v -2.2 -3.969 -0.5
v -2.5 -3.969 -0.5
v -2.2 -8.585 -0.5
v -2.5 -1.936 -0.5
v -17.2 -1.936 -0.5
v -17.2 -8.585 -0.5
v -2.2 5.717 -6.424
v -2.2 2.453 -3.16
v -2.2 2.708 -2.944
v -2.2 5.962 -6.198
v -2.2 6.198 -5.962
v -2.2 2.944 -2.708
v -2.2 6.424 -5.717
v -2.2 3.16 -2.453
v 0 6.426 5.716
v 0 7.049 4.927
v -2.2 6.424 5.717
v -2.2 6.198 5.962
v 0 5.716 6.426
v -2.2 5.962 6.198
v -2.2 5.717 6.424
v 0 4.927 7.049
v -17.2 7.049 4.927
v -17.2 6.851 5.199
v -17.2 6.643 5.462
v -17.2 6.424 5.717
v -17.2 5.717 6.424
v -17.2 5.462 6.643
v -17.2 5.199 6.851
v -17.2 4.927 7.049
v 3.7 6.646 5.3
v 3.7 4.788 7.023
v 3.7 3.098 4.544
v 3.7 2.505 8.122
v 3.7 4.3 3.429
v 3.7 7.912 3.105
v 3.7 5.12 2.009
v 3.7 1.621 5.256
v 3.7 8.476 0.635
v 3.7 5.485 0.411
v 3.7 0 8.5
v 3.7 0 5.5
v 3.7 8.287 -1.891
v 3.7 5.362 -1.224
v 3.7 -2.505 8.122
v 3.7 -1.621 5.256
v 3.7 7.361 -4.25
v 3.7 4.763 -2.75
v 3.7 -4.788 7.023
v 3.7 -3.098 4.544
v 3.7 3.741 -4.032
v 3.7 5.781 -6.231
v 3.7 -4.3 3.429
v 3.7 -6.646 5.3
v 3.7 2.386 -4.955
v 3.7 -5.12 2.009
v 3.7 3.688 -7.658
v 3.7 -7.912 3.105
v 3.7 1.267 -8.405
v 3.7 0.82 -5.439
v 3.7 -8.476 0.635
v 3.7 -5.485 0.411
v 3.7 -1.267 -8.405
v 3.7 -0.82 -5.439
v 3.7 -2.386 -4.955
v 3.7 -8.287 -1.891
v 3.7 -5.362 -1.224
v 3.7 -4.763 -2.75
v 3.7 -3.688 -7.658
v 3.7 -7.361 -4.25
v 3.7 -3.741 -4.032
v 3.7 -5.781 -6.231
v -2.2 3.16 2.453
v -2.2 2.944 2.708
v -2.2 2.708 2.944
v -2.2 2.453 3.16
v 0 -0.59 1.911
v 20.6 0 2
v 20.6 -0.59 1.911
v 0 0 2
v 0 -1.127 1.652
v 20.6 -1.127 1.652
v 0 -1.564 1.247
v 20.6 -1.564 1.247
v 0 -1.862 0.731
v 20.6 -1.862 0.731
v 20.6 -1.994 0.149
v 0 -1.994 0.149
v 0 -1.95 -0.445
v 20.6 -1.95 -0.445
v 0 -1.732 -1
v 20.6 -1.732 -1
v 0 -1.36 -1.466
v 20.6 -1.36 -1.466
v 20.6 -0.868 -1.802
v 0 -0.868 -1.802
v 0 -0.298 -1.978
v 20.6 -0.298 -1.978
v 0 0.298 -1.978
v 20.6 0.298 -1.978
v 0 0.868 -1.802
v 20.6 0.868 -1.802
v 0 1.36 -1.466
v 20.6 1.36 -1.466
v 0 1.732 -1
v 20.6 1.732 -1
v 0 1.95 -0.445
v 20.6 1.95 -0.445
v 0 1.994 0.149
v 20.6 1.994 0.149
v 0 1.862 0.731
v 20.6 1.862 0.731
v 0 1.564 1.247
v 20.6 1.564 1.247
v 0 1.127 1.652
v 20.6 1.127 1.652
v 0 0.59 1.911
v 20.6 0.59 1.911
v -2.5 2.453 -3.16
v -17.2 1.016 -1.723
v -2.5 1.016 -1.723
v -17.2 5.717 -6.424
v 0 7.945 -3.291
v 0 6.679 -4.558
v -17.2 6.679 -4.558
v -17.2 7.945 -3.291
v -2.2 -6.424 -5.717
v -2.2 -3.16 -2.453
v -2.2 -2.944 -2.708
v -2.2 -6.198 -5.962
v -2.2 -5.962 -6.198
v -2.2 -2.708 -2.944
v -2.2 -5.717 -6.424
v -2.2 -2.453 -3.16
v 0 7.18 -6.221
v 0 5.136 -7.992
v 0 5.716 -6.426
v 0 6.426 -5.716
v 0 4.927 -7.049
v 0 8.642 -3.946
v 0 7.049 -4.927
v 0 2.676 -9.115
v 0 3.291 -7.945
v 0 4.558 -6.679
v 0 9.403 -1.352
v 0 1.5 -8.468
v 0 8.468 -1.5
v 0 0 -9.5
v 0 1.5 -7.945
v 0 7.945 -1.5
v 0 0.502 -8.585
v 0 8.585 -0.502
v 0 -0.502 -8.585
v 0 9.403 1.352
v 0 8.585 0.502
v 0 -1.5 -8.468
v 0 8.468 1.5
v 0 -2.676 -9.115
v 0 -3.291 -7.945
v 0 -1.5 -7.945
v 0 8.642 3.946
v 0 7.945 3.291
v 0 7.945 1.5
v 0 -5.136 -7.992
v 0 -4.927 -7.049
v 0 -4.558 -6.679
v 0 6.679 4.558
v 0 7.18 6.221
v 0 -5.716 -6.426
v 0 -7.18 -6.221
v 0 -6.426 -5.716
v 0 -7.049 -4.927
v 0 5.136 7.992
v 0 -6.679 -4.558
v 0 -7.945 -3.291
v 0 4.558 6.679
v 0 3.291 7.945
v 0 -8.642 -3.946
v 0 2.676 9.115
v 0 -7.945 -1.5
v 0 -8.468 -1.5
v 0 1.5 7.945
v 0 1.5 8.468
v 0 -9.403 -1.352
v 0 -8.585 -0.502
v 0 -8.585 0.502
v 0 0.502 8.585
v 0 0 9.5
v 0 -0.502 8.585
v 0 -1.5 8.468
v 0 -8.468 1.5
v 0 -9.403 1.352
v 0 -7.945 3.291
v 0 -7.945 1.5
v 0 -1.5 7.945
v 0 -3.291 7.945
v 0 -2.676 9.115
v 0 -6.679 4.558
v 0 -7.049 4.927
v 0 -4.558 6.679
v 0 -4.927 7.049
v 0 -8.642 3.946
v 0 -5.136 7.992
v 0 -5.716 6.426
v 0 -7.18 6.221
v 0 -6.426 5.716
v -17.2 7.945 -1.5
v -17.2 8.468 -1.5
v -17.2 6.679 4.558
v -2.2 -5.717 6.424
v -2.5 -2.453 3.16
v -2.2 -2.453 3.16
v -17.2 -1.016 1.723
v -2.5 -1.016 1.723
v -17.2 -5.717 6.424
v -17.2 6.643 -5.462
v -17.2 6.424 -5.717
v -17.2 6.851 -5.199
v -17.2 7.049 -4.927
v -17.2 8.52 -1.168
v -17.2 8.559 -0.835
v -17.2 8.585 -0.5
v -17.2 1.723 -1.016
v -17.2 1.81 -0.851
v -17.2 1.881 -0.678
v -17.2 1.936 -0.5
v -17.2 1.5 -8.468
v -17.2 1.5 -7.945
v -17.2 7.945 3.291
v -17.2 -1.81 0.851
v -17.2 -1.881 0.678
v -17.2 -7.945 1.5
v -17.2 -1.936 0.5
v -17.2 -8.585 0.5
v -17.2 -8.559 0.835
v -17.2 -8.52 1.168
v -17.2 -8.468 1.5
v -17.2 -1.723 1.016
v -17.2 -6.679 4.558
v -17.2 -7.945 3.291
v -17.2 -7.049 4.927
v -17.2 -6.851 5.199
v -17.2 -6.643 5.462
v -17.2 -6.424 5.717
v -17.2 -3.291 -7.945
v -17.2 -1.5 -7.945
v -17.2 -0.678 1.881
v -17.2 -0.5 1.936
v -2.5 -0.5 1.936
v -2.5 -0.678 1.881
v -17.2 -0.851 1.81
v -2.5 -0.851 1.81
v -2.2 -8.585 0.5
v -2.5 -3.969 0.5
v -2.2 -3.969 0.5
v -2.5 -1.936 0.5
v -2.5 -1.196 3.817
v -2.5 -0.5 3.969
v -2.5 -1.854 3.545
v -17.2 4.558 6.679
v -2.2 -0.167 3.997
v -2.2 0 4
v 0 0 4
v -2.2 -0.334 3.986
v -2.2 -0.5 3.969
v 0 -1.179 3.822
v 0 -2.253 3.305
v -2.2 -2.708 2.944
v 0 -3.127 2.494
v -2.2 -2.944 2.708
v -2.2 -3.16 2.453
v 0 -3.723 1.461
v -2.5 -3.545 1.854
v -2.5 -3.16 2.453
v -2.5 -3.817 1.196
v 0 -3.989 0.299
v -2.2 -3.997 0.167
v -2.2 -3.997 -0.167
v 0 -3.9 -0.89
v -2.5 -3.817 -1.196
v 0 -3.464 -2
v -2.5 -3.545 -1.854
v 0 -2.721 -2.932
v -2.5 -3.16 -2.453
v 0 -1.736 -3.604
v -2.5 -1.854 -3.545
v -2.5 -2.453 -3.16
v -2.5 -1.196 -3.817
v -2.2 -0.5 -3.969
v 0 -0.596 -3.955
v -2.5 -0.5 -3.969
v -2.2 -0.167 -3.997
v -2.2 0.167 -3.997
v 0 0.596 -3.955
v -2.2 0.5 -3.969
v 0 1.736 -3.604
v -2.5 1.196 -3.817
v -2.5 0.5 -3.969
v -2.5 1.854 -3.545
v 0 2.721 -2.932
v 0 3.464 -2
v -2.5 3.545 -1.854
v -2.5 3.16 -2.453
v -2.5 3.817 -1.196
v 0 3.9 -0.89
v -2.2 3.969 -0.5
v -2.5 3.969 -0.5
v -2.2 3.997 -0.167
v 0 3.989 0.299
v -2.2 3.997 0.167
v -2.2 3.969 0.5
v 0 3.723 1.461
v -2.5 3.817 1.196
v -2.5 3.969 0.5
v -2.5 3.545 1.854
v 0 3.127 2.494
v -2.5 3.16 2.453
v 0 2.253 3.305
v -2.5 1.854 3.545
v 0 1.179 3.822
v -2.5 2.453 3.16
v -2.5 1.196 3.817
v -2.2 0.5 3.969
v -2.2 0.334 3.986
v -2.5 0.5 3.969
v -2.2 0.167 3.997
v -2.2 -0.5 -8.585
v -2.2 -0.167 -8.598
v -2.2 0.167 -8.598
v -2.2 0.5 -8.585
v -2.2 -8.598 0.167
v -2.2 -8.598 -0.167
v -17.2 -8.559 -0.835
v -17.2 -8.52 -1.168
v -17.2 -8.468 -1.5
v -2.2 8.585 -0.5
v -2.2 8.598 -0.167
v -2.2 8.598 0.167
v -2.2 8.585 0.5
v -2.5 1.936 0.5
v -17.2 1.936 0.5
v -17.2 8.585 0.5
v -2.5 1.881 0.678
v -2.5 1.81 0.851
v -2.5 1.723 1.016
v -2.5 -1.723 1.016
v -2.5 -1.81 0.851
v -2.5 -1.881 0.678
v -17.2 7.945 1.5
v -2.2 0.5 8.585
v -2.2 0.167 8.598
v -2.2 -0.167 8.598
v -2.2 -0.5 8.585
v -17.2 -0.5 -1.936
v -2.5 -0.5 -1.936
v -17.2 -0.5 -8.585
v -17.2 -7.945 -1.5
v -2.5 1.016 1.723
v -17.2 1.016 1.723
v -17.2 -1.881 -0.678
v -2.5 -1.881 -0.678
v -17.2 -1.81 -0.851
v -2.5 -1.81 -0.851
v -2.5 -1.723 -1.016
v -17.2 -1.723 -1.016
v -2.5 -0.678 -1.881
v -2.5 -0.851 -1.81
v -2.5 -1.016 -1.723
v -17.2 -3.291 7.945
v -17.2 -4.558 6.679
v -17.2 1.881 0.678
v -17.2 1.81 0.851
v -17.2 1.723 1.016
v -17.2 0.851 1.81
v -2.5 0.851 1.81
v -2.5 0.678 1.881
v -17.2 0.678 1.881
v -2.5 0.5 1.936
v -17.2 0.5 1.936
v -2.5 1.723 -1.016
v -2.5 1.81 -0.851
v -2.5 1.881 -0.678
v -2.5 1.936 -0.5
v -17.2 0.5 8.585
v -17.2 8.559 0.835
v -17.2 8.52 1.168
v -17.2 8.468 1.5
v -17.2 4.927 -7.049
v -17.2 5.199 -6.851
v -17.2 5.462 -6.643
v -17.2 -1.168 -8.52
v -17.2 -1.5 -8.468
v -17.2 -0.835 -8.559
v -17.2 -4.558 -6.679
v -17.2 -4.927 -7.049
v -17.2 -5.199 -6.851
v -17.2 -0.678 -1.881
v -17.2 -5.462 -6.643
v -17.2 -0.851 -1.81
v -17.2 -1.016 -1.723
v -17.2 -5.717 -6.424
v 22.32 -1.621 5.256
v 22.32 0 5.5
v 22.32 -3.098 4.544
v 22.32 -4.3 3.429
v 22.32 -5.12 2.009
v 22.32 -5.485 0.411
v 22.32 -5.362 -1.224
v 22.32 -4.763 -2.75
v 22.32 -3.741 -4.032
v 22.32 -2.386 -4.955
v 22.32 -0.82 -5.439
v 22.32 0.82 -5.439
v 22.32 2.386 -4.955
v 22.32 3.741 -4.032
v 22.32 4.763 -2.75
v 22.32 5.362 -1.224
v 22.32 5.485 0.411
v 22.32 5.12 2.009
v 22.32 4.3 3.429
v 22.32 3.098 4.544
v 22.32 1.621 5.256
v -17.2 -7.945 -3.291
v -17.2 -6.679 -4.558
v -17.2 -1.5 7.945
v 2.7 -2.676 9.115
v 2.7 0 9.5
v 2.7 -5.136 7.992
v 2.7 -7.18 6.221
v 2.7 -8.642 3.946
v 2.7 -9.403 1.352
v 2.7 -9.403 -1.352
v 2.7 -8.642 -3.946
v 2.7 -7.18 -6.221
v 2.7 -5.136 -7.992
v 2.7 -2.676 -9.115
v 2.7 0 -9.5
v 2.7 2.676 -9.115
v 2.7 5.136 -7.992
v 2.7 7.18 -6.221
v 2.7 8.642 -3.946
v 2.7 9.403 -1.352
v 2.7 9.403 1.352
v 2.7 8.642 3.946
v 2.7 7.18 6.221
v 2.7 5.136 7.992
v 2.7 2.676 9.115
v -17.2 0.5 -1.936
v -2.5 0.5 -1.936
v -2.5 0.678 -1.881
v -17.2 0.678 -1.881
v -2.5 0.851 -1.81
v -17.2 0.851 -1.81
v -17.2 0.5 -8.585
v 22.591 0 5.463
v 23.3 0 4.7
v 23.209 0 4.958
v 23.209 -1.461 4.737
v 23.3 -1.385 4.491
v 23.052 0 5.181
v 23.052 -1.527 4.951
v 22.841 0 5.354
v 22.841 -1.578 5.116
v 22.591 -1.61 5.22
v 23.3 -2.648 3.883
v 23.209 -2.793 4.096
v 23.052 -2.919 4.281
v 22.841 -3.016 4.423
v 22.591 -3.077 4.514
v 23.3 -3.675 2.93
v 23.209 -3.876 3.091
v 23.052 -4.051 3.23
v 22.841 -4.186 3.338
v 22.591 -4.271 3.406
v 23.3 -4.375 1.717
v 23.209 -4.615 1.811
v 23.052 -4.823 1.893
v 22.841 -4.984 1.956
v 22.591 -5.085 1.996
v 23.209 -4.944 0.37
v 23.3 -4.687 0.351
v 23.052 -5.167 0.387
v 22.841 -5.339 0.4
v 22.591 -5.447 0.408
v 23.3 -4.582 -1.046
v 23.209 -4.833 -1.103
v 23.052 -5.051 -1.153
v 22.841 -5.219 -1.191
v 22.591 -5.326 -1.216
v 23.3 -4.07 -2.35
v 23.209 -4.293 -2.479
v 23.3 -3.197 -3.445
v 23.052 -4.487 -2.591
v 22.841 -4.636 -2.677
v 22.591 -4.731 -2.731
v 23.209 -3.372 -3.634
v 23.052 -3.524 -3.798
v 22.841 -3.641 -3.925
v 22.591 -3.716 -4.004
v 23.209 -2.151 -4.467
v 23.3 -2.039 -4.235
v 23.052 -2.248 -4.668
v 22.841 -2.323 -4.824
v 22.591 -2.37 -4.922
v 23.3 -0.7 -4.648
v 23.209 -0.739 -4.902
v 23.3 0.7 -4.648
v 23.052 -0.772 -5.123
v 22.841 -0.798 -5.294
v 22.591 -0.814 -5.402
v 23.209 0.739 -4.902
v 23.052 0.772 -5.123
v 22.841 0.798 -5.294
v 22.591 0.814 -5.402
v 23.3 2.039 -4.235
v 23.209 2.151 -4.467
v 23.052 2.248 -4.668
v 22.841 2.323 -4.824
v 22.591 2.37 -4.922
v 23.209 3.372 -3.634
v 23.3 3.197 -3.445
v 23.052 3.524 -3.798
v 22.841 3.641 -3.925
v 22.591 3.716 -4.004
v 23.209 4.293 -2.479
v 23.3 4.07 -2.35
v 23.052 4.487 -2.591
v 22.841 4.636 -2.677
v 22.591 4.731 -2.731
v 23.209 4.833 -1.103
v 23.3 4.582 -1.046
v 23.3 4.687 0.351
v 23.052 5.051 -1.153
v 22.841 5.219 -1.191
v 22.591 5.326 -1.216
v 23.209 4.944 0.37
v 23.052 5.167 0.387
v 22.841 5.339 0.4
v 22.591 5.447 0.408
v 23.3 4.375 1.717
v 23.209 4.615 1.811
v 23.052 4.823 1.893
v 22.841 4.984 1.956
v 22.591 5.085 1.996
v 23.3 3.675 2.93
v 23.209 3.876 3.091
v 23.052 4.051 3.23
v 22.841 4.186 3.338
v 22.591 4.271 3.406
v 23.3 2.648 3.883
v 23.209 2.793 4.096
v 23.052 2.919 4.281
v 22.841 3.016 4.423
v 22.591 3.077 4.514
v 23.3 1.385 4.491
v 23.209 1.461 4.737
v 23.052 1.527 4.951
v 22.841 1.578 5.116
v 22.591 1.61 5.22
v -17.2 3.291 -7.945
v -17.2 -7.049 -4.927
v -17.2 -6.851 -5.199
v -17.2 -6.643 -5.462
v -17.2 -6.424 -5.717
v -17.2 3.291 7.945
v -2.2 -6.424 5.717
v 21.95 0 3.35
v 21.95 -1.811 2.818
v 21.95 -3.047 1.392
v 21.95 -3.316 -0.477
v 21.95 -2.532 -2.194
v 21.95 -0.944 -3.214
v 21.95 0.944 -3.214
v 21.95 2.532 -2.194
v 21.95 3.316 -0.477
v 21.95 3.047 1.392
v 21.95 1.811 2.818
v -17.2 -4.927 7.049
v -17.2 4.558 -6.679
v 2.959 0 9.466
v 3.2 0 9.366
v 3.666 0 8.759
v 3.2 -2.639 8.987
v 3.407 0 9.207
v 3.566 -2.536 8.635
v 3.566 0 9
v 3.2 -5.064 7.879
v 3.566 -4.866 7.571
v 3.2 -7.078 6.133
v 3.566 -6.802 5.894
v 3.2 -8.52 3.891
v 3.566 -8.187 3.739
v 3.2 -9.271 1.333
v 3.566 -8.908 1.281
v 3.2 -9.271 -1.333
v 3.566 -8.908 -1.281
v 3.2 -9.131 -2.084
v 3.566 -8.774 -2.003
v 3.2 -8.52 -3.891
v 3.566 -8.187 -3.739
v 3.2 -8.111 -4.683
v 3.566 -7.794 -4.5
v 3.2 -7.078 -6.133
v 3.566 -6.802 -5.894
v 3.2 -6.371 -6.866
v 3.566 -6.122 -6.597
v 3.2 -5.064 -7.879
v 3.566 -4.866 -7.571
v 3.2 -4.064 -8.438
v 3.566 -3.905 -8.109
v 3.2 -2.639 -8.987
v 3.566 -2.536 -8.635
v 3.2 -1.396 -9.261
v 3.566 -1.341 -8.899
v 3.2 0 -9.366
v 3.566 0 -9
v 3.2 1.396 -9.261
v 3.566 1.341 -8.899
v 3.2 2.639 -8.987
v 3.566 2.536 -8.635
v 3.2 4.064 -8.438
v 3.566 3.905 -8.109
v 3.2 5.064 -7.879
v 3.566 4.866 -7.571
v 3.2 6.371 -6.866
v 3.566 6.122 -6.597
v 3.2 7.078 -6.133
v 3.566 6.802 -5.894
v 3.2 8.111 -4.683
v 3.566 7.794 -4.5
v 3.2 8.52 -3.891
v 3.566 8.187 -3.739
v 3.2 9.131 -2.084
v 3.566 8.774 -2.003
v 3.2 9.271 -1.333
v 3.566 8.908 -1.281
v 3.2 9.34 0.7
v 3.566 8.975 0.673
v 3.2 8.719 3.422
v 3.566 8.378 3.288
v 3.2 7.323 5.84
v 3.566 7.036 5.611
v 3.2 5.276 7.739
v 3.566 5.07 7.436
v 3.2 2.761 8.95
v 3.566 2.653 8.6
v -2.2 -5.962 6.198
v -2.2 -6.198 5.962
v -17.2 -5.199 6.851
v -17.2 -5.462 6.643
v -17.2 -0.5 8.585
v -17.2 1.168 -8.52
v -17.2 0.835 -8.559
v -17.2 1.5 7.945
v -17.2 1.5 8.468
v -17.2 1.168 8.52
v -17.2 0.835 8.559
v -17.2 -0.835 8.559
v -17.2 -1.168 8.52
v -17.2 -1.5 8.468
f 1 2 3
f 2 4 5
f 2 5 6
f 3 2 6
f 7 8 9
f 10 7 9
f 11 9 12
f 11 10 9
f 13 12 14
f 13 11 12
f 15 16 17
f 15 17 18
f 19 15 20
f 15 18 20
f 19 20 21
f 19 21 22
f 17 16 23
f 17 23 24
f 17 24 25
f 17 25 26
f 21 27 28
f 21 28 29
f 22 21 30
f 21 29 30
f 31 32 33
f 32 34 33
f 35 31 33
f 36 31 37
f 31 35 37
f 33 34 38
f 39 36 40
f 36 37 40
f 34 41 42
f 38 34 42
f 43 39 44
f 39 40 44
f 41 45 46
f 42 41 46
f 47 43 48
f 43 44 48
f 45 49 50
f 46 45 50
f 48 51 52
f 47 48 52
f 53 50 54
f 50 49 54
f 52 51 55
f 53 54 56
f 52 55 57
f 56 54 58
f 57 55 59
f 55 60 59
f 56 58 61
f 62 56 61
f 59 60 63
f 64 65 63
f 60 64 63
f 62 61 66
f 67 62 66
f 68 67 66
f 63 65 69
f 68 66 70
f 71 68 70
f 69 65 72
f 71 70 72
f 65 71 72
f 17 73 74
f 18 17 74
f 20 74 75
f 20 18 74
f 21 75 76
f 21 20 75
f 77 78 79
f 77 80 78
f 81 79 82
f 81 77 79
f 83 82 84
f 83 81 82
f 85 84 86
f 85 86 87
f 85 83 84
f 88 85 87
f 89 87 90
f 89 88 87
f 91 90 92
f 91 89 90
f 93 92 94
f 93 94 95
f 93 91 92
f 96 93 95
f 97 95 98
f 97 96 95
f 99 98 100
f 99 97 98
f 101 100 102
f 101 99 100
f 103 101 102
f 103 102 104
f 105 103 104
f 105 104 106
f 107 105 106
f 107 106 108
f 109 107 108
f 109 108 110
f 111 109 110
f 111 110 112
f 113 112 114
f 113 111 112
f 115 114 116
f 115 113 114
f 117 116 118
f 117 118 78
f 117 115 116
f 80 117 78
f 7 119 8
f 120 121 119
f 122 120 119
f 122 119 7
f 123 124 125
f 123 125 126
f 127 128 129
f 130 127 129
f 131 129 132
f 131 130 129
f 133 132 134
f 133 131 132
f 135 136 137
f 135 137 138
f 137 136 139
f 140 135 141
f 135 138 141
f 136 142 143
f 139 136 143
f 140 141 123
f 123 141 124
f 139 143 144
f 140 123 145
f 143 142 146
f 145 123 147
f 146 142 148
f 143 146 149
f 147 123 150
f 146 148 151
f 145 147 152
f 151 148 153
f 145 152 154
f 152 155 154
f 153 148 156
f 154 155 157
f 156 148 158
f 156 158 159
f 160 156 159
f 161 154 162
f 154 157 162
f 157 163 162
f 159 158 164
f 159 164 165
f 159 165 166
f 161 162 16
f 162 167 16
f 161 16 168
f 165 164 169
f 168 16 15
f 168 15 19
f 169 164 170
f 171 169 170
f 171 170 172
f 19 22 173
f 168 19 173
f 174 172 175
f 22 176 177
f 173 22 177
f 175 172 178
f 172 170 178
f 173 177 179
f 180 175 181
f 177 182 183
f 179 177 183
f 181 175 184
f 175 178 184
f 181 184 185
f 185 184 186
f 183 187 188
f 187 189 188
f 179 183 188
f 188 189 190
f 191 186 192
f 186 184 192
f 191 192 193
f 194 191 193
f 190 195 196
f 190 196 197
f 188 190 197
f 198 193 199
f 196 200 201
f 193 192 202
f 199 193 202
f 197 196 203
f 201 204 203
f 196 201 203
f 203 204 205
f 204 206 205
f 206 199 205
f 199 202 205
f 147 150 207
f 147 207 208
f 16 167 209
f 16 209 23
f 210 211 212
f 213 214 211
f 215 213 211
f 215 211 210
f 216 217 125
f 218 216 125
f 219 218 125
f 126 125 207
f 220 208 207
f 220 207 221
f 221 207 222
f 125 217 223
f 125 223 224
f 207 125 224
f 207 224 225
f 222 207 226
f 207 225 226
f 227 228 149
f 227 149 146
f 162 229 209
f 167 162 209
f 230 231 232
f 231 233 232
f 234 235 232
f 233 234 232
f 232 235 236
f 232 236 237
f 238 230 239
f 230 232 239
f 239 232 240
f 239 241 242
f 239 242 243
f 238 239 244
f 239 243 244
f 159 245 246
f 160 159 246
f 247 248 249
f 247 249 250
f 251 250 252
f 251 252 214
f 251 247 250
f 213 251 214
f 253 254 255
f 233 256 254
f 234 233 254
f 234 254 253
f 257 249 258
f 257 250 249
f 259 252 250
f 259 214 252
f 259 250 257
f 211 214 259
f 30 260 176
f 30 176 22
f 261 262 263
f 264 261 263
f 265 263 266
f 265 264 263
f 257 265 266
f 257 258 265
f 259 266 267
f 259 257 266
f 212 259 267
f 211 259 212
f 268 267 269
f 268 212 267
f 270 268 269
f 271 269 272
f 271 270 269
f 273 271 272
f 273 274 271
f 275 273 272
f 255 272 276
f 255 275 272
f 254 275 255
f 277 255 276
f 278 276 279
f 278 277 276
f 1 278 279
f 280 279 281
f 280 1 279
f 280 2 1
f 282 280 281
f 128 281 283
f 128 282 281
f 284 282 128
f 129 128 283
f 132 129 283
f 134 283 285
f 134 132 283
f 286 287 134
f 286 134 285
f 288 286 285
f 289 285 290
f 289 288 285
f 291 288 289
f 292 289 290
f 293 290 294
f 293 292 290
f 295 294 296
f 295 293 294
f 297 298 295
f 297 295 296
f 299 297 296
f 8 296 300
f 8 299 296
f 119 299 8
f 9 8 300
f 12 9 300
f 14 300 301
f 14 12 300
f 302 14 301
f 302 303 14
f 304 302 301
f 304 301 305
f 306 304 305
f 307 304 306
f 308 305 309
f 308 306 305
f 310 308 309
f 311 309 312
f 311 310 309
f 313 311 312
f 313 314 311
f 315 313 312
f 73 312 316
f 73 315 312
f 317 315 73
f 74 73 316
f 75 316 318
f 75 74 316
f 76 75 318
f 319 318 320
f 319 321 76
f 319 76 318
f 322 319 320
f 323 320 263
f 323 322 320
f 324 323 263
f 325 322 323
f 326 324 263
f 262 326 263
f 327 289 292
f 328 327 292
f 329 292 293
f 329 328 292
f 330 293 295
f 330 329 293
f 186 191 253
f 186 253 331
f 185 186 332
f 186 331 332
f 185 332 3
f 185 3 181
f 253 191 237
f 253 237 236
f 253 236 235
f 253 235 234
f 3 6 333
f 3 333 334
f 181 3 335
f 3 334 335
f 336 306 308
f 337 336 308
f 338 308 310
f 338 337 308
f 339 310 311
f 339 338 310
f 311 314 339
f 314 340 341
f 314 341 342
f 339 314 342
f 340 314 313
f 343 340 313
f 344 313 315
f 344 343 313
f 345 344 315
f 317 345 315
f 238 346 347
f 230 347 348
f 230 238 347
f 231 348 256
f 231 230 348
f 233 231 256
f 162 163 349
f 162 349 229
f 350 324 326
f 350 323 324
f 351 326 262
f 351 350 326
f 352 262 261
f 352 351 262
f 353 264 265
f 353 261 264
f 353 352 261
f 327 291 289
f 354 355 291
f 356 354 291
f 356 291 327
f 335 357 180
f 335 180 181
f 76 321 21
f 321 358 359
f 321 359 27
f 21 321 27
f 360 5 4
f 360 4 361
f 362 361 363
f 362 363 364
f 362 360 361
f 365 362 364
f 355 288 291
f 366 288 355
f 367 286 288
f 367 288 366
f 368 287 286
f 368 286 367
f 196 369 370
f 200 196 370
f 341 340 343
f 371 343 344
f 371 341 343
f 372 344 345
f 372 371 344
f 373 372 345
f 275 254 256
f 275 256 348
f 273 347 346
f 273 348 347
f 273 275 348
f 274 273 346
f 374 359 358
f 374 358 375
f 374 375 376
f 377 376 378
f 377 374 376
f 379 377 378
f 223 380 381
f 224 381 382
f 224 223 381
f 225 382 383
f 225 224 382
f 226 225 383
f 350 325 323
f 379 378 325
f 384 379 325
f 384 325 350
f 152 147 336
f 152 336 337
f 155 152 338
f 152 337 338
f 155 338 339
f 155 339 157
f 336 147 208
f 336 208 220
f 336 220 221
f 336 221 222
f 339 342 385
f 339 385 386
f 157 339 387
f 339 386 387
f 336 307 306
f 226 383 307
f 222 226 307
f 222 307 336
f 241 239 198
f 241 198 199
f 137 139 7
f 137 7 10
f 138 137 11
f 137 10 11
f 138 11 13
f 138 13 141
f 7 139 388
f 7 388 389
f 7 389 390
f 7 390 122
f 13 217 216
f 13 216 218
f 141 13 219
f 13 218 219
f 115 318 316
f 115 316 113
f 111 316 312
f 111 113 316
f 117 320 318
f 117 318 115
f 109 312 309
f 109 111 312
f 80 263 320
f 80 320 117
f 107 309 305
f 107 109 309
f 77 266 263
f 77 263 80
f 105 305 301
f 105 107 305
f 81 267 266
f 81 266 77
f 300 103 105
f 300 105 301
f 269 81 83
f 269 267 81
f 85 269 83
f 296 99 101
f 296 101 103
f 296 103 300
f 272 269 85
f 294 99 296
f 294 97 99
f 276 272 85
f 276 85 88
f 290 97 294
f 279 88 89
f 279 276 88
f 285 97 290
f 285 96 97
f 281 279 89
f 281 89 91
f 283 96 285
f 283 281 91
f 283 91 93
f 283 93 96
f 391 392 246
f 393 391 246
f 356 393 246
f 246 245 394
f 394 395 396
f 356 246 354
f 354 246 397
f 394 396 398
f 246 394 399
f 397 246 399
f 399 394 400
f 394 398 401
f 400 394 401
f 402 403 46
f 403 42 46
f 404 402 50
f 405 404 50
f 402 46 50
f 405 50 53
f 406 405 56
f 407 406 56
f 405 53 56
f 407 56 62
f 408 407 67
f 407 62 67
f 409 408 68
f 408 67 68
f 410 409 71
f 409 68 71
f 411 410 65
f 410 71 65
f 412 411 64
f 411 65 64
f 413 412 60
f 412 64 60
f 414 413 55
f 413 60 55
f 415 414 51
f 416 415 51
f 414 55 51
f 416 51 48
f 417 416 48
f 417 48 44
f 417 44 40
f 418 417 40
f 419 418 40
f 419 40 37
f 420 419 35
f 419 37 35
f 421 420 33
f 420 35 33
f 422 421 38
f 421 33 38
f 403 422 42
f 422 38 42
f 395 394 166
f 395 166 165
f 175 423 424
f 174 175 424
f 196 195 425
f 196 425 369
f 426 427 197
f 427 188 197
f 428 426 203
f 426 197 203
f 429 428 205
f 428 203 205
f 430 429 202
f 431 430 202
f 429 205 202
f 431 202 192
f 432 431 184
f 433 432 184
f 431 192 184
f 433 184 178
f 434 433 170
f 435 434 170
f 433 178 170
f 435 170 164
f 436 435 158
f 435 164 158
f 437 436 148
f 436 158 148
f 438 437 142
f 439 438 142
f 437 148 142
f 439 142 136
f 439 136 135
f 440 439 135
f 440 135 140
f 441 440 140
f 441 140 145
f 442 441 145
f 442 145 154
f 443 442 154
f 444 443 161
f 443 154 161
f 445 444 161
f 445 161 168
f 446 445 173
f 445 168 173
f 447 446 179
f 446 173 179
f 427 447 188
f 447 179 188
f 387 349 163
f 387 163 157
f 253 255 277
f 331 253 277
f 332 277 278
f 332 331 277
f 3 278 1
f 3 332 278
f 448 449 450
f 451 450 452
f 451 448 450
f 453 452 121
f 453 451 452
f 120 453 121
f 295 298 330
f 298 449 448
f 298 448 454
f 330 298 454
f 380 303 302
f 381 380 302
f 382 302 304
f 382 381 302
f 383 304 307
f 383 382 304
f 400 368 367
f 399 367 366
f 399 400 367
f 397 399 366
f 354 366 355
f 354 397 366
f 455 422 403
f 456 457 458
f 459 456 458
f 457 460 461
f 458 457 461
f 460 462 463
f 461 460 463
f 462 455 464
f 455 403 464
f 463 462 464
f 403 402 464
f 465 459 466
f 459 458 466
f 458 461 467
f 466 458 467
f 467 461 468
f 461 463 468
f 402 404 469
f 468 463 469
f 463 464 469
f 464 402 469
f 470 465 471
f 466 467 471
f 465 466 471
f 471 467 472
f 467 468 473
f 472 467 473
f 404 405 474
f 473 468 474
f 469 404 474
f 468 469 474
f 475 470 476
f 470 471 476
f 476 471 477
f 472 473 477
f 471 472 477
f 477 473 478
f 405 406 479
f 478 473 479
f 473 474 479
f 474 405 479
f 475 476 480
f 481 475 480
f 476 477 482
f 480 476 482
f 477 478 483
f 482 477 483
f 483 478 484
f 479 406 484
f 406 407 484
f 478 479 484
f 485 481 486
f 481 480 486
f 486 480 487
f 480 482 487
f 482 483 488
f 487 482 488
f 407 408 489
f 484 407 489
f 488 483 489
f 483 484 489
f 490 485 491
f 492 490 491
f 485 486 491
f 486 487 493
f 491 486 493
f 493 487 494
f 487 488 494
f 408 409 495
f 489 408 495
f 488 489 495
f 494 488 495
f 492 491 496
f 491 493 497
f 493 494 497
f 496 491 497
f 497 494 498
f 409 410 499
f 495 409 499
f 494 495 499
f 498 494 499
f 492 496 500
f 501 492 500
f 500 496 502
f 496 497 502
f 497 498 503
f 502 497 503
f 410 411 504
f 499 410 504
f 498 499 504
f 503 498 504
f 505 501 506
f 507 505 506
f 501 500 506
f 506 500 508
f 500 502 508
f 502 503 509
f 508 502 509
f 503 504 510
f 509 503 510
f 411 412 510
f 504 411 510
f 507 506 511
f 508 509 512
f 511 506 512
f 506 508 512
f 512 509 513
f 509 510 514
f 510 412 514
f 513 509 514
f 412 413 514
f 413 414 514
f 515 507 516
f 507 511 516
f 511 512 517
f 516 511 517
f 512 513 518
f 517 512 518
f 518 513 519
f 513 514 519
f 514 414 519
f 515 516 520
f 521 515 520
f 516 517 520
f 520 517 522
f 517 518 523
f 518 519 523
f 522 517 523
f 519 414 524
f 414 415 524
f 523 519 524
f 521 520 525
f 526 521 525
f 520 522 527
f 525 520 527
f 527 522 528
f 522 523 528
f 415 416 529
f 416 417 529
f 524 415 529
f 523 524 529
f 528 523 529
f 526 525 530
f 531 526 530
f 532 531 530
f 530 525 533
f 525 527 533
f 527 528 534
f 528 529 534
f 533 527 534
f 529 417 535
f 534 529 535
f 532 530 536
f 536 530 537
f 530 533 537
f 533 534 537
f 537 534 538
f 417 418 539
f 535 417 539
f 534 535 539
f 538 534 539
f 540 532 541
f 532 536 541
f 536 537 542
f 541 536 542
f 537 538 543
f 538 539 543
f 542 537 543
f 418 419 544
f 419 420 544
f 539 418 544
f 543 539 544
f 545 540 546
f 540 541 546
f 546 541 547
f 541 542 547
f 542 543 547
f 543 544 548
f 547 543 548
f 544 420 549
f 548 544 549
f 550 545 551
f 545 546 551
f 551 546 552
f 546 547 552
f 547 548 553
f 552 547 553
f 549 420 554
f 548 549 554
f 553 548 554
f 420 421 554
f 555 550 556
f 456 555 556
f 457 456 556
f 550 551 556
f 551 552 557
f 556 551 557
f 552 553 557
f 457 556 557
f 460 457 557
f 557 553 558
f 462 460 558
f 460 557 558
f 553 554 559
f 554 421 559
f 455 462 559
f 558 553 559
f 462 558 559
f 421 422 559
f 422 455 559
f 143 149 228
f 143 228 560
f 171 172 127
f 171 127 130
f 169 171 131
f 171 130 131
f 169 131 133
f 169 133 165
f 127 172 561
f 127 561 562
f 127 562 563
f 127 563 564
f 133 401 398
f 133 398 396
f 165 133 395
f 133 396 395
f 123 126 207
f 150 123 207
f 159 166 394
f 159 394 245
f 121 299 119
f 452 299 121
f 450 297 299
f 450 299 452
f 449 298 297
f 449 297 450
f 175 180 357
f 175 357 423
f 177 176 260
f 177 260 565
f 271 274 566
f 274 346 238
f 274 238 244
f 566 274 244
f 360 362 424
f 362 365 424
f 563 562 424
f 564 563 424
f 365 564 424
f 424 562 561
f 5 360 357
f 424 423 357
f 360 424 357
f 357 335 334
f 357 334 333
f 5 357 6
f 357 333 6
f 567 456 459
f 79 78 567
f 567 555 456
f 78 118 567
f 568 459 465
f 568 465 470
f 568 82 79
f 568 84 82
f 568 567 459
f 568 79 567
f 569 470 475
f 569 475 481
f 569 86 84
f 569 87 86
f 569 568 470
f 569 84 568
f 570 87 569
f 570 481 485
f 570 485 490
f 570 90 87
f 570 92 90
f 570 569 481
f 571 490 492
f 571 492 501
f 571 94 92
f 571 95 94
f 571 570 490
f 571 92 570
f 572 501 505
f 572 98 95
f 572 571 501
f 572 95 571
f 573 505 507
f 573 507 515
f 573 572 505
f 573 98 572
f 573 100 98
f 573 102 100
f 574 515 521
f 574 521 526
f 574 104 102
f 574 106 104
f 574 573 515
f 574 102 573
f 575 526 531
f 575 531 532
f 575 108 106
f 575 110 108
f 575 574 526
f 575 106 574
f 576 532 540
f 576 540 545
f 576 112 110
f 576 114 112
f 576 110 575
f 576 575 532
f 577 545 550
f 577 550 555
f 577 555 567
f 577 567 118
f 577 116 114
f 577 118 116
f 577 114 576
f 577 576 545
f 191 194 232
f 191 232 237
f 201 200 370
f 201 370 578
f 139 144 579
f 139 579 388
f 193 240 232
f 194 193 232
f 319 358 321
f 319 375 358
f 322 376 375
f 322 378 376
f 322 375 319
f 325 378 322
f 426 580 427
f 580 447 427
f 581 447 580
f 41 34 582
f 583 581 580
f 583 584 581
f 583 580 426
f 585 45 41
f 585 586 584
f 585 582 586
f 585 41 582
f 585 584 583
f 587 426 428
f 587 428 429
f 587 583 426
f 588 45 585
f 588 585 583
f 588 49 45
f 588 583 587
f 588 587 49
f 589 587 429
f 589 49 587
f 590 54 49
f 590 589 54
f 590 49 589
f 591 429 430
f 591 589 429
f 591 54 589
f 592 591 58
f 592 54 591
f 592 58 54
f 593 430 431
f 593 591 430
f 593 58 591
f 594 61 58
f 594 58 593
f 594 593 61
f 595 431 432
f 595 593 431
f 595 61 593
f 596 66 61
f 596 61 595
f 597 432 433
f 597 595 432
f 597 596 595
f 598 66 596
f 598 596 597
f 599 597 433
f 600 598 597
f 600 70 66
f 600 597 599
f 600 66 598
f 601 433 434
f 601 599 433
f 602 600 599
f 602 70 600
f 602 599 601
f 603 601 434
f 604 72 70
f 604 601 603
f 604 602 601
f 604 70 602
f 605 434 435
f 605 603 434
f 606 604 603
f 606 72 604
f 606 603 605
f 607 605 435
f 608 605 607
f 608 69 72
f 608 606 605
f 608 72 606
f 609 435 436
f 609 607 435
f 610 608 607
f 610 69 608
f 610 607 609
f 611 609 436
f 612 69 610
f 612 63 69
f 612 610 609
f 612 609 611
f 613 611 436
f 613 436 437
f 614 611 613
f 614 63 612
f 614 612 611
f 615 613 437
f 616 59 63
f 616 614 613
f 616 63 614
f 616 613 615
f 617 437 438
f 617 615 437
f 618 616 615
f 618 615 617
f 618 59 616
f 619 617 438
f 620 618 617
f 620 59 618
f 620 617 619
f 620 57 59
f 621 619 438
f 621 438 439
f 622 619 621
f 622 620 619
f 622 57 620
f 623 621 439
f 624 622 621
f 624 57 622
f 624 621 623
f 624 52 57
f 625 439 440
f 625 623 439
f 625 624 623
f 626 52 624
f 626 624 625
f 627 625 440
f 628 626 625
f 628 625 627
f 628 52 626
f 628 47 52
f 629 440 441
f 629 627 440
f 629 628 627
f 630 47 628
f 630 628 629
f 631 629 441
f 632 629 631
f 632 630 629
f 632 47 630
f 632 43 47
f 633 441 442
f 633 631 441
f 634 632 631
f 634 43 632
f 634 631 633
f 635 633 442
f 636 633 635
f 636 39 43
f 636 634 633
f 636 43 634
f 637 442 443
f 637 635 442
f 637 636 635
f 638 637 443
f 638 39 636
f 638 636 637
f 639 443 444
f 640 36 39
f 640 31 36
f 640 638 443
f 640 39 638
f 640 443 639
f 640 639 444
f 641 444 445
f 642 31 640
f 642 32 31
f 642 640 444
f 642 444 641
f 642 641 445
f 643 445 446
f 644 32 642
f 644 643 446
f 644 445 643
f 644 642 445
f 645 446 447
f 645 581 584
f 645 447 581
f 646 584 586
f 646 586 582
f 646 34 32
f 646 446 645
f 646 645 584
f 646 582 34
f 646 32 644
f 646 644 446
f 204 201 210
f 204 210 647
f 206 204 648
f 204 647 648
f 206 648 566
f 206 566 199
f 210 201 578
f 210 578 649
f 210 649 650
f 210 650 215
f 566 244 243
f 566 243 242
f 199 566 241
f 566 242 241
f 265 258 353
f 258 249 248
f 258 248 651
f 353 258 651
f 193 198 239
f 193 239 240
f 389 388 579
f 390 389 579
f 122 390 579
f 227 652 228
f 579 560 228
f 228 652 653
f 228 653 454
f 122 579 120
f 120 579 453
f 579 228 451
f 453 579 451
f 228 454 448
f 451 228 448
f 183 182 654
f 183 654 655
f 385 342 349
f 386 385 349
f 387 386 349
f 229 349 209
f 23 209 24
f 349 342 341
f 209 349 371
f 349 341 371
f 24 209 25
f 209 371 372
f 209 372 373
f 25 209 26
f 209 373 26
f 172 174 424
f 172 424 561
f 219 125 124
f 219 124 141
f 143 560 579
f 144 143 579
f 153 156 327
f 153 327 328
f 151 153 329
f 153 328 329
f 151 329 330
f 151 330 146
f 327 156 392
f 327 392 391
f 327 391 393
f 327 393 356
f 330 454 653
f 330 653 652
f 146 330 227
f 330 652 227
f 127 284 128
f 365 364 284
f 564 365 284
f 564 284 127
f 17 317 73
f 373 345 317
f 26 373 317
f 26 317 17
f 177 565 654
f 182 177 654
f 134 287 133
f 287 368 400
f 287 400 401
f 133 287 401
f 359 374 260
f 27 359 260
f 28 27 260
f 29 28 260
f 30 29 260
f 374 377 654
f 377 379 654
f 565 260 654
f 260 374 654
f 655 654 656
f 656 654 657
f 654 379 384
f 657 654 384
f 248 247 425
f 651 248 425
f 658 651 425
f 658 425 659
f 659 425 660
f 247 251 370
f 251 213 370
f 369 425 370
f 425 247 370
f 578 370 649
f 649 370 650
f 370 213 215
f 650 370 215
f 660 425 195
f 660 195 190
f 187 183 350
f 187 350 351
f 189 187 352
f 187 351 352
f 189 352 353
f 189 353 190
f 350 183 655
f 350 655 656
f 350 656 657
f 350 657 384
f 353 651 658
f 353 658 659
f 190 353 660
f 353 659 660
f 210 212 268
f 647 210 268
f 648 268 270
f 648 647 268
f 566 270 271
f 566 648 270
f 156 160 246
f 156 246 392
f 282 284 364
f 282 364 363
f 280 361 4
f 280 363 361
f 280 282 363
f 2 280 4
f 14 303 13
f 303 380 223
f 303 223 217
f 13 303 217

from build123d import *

# Parameters (mm, degrees)
F5_W            = 1
F5_H            = 9
F6_DEPTH        = 15
F6_COPIES_COUNT = 8
F7_W            = 1.7910775183
F7_H            = 2
F8_DEPTH        = 17.2
F8_COPIES_COUNT = 8


# Not quite as in the source:
# - a fillet or chamfer that OpenCascade refuses, or shapes differently, is made with other operations: its cross-section is extruded or revolved along the edge and cut away or added
# - a pattern or mirror of a feature is missing from the dataset's text; its kind, count and spacing are read off the source's solid


with BuildPart() as f2:
    # F0 (on Front) → F2 (revolve)
    with BuildSketch(Plane.XZ):
        Polygon((-17.2, 0), (23.3, 0), (23.3, 5.5), (3.7, 5.5), (3.7, 9.5), (0, 9.5), (0, 8.6), (-17.2, 8.6), align=None)
    revolve(axis=Axis((3.6722049117, 0, 0), (1, 0, 0)))

    # F3 (on Front) → F4 (revolve, cut)
    with BuildSketch(Plane.XZ):
        Polygon((-17.2, 0), (23.3, 0), (23.3, 4.7), (20.6, 2), (0, 2), (0, 4), (-2.5, 4), (-2.5, 2), (-17.2, 2), align=None)
    revolve(axis=Axis((3.05, 0, 0), (1, 0, 0)), mode=Mode.SUBTRACT)

    # F5 (on face) → F6 (cut)
    with BuildSketch(Plane(origin=(-17.2, 0, 0), x_dir=(0, -1, 0), z_dir=(-1, 0, 0))):
        with Locations((0, 4.5)):
            Rectangle(F5_W, F5_H)
    f6 = extrude(amount=-F6_DEPTH, mode=Mode.SUBTRACT)

    # F6_copies: F6 ×8 about axis
    f6_copies_axis = Axis((0, 0, 0), (1, 0, 0))
    for i in range(1, F6_COPIES_COUNT):
        add(f6.rotate(f6_copies_axis, i * 360 / F6_COPIES_COUNT), mode=Mode.SUBTRACT)

    # F7 (on face) → F8 (cut, through all)
    with BuildSketch(Plane(origin=(-17.2, 0, 0), x_dir=(0, -1, 0), z_dir=(-1, 0, 0))):
        Polygon((4.7052910807, 9.359577542), (3.2910775183, 7.9453639796), (4.5575605772, 6.6788809207), (5.9717741396, 8.0930944831), align=None)
        with Locations((2.3955387592, 8.9453639796)):
            Rectangle(F7_W, F7_H)
    f8 = extrude(amount=-F8_DEPTH, mode=Mode.SUBTRACT)

    # F8_copies: F8 ×8 about axis
    f8_copies_axis = Axis((0, 0, 0), (1, 0, 0))
    for i in range(1, F8_COPIES_COUNT):
        add(f8.rotate(f8_copies_axis, i * 360 / F8_COPIES_COUNT), mode=Mode.SUBTRACT)

    # F9: fillet of radius 1 on 2 edges, made by hand

    # F9_s1 → F9_t2 (revolve, cut)
    with BuildSketch(Plane.XZ):
        with BuildLine():
            ThreePointArc((23.3, 4.7), (22.9526596349, 5.2745966692), (22.3202041029, 5.5))
            Line((22.3202041029, 5.5), (23.3, 5.5))
            Line((23.3, 5.5), (23.3, 4.7))
        make_face()
    revolve(axis=Axis((23.3, 0, 0), (1, 0, 0)), mode=Mode.SUBTRACT)

    # F9_s3 → F9_t4 (revolve, cut)
    with BuildSketch(Plane.XZ):
        with BuildLine():
            ThreePointArc((2.7, 9.5), (3.4071067812, 9.2071067812), (3.7, 8.5))
            Line((3.7, 8.5), (3.7, 9.5))
            Line((3.7, 9.5), (2.7, 9.5))
        make_face()
    revolve(axis=Axis((3.7, 0, 0), (1, 0, 0)), mode=Mode.SUBTRACT)


solid = f2.part
